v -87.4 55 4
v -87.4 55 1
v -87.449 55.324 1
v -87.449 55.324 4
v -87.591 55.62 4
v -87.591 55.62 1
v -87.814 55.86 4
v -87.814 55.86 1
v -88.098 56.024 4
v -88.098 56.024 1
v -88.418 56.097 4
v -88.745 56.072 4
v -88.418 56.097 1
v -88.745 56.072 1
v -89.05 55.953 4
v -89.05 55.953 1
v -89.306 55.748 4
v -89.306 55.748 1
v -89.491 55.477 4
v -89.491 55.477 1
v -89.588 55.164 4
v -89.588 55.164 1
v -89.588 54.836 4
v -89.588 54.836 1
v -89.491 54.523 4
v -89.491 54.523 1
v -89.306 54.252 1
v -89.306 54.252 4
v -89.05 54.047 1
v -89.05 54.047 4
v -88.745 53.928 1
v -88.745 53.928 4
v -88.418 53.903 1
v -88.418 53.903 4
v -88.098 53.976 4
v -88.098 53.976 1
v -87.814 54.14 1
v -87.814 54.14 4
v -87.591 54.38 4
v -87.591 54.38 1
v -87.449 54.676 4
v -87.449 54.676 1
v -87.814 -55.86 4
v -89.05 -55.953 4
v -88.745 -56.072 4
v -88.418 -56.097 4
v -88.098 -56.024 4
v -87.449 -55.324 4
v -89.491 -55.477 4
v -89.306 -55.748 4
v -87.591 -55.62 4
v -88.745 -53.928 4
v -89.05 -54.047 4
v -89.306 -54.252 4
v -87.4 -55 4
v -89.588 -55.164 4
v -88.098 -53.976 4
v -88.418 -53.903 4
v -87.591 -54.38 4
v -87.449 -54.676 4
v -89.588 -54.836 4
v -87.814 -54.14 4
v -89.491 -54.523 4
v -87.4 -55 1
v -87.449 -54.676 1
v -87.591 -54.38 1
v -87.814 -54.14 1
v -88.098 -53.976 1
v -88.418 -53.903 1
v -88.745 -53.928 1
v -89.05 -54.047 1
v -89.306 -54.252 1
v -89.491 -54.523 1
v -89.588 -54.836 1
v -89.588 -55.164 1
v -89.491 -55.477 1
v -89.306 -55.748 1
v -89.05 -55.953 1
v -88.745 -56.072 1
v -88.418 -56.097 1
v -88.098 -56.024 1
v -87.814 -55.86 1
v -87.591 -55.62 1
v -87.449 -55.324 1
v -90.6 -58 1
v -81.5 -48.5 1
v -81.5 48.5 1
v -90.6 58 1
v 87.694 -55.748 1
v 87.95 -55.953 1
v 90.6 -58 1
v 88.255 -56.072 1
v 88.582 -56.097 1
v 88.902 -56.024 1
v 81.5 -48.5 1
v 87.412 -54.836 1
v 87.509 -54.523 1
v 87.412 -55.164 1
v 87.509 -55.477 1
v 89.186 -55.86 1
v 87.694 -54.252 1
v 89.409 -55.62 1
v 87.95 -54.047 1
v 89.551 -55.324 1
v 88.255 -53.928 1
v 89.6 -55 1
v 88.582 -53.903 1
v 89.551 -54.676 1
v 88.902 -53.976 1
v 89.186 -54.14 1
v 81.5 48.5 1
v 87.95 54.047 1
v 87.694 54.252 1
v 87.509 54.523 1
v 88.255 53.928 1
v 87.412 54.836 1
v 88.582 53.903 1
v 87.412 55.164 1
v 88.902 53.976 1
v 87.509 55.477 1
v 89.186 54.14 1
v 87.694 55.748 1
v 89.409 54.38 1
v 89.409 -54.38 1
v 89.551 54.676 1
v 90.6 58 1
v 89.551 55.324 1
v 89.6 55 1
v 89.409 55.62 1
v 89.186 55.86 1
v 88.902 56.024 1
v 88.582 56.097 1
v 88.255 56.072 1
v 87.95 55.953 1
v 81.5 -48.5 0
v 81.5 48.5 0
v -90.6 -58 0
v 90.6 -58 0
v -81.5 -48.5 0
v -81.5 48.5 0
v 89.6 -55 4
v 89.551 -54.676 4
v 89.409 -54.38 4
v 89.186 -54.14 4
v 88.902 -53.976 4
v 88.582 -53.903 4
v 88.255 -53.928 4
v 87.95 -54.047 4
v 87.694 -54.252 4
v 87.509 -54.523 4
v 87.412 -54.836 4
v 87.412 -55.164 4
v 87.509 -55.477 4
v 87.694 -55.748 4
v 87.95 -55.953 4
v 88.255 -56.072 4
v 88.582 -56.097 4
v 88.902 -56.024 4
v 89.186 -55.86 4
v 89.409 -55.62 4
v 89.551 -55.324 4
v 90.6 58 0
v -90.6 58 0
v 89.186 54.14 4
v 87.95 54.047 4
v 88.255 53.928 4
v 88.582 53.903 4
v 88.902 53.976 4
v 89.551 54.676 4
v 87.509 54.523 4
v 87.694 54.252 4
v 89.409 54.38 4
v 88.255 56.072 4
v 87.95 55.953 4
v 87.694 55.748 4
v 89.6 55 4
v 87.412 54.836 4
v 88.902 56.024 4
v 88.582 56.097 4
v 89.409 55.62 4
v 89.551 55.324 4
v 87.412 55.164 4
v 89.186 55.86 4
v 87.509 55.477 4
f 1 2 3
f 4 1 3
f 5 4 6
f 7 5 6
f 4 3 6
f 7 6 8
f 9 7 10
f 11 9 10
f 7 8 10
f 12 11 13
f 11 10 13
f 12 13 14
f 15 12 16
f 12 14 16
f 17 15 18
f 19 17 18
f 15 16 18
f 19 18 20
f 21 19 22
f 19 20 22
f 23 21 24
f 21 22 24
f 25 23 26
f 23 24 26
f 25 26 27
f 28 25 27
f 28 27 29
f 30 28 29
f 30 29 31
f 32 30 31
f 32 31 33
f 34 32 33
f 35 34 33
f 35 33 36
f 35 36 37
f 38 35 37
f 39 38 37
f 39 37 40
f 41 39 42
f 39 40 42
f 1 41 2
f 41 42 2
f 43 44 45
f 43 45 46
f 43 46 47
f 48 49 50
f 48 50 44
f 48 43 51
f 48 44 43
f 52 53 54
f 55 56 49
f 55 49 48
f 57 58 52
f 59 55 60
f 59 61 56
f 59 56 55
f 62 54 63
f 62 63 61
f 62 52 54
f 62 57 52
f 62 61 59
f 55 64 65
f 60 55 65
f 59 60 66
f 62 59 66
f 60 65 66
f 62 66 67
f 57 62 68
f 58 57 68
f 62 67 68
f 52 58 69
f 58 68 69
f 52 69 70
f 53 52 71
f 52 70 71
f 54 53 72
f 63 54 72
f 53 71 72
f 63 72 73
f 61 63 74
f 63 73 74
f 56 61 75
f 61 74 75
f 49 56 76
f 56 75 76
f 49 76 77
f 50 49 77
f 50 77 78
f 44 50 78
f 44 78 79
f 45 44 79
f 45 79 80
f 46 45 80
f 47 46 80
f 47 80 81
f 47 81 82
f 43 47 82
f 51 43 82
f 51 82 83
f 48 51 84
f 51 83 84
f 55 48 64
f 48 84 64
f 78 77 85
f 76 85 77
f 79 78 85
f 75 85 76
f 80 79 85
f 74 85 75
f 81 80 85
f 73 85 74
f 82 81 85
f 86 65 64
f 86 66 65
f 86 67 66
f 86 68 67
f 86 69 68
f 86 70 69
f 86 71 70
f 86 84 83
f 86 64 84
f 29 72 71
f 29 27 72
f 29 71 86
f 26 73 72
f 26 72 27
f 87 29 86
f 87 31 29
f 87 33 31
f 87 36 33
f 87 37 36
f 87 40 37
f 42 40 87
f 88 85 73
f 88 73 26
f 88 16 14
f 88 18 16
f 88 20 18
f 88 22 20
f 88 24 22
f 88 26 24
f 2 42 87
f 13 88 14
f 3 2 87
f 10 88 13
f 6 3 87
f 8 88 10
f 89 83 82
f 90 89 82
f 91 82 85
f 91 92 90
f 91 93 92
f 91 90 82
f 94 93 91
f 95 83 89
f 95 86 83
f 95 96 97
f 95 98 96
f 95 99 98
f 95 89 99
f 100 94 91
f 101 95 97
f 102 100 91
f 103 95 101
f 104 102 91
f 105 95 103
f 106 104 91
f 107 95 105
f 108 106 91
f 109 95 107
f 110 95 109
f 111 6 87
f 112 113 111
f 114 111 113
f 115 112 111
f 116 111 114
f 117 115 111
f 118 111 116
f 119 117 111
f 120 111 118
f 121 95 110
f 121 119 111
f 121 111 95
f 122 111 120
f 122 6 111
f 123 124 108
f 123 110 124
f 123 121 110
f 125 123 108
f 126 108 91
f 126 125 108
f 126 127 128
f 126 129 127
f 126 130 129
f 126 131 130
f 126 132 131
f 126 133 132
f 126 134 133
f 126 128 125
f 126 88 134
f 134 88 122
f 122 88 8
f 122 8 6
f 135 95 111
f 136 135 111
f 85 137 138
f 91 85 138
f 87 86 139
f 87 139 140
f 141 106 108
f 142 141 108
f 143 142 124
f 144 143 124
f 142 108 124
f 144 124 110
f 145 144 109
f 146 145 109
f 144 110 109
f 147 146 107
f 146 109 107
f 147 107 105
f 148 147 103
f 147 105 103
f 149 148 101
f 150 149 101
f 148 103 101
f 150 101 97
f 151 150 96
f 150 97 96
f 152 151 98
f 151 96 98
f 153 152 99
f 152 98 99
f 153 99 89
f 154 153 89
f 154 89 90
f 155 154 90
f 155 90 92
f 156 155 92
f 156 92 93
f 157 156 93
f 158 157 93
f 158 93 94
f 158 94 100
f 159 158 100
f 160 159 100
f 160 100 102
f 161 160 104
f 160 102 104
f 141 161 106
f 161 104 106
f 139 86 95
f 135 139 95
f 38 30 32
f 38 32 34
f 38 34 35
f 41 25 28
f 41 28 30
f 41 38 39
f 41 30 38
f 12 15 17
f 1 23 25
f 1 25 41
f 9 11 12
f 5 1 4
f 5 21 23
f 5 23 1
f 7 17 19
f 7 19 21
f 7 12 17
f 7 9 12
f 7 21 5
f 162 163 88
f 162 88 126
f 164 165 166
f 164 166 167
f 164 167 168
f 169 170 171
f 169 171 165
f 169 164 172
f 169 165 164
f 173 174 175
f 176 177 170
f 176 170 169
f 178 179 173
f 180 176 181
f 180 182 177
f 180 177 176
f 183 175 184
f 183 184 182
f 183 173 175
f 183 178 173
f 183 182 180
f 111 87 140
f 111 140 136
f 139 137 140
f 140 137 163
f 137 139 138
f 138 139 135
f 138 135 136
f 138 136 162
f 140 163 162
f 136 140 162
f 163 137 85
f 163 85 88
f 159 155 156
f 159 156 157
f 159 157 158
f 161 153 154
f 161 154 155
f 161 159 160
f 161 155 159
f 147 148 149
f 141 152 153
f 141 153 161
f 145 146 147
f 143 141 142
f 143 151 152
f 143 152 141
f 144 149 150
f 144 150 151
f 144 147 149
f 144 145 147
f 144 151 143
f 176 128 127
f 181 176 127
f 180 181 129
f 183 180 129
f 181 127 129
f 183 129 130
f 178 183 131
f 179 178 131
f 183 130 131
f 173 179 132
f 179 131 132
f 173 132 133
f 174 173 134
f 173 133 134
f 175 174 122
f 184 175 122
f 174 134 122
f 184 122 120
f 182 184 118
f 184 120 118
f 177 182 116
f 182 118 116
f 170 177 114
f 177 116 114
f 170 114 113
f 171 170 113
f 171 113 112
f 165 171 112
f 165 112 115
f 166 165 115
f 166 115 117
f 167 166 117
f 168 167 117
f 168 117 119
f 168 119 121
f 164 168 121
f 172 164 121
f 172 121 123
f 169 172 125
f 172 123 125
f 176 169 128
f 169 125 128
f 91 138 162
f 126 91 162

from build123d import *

# Parameters (mm, degrees)
SKETCH_1_W          = 181.2
SKETCH_1_H          = 116
EXTRUDE_1_DEPTH     = 1
SKETCH_2_W          = 163
SKETCH_2_H          = 97
CUT_EXTRUDE_1_DEPTH = 1
SKETCH_3_R          = 1.1
EXTRUDE_2_DEPTH     = 3


with BuildPart() as part:
    # 草图1 → 凸台-拉伸1 (new body)
    with BuildSketch(Plane.XY):
        Rectangle(SKETCH_1_W, SKETCH_1_H)
    extrude(amount=EXTRUDE_1_DEPTH)

    # 草图2 → 切除-拉伸1 (cut)
    with BuildSketch(Plane.XY.offset(1)):
        Rectangle(SKETCH_2_W, SKETCH_2_H)
    extrude(amount=-CUT_EXTRUDE_1_DEPTH, mode=Mode.SUBTRACT)

    # 草图3 → 凸台-拉伸2 (add)
    with BuildSketch(Plane.XY.offset(1)):
        with Locations((-88.5, 55)):
            Circle(SKETCH_3_R)
        with Locations((-88.5, -55)):
            Circle(SKETCH_3_R)
        with Locations((88.5, -55)):
            Circle(SKETCH_3_R)
        with Locations((88.5, 55)):
            Circle(SKETCH_3_R)
    extrude(amount=EXTRUDE_2_DEPTH)


solid = part.part
